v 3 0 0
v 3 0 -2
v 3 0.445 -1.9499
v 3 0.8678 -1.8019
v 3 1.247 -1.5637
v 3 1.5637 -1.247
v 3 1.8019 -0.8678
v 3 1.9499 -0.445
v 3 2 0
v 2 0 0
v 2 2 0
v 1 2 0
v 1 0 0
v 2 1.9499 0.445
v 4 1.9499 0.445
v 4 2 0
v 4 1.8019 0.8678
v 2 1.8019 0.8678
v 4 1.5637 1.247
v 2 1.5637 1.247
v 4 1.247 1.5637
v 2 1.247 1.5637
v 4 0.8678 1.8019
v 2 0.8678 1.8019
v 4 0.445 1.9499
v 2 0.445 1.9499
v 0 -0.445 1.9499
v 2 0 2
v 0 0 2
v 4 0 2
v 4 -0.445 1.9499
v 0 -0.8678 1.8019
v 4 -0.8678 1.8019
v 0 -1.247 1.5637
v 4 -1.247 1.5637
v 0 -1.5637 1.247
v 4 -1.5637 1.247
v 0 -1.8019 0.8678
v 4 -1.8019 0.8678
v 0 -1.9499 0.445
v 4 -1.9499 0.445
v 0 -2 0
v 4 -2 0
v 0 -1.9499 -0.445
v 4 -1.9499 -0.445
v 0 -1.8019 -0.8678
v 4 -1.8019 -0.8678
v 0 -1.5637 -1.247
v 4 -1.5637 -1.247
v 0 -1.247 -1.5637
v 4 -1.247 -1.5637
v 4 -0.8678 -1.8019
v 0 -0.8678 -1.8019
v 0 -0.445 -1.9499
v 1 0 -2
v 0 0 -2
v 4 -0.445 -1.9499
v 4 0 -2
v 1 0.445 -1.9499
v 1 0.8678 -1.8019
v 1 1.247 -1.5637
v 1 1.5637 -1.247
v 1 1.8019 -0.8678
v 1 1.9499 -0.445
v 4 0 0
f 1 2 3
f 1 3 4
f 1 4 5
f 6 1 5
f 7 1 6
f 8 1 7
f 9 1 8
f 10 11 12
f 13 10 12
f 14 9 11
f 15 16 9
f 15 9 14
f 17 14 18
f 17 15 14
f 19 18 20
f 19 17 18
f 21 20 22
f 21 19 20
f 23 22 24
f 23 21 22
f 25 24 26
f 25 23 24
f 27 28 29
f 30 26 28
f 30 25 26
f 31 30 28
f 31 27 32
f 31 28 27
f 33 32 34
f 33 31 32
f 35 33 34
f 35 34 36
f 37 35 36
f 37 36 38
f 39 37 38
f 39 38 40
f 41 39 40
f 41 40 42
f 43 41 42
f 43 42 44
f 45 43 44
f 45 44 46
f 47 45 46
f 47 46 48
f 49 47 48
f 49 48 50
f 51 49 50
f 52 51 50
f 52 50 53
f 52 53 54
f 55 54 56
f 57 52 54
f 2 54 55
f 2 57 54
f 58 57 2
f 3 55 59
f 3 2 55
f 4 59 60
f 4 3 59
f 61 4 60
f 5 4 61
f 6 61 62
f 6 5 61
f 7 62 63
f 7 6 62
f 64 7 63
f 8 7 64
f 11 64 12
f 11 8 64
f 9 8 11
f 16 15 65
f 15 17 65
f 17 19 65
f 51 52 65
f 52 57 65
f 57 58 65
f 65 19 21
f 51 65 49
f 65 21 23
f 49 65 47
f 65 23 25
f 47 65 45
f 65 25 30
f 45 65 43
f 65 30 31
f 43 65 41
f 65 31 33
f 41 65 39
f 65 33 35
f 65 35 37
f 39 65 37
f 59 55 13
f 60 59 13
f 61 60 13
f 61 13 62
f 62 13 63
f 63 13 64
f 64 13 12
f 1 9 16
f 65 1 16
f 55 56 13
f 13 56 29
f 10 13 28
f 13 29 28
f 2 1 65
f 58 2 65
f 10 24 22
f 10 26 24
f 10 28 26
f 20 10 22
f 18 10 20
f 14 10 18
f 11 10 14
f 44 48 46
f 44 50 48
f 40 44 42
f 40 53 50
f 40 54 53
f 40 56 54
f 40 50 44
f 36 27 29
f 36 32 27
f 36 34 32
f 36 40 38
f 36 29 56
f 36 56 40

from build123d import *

# Parameters (mm, degrees)
SKETCH5_W          = 4
SKETCH5_H          = 2
SKETCH6_W          = 1
SKETCH6_H          = 2
CUT_EXTRUDE5_DEPTH = 11
SKETCH8_W          = 0.5
SKETCH8_H          = 2
CUT_EXTRUDE7_DEPTH = 10
SKETCH9_W          = 1.5
SKETCH9_H          = 2
CUT_EXTRUDE8_DEPTH = 10


with BuildPart() as part:
    # Sketch5 → Revolve-Thin2 (revolve)
    with BuildSketch(Plane.XY):
        with Locations((2, 1)):
            Rectangle(SKETCH5_W, SKETCH5_H)
    revolve(axis=Axis((0, 0, 0), (1, 0, 0)))

    # Sketch6 → Cut-Extrude5 (cut)
    with BuildSketch(Plane.XY):
        with Locations((3.5, 1)):
            Rectangle(SKETCH6_W, SKETCH6_H)
        with Locations((0.5, 1)):
            Rectangle(SKETCH6_W, SKETCH6_H)
    extrude(amount=-CUT_EXTRUDE5_DEPTH, mode=Mode.SUBTRACT)

    # Sketch8 → Cut-Extrude7 (cut)
    with BuildSketch(Plane(origin=(0, 0, 0), x_dir=(-1, 0, 0), z_dir=(0, 0, -1))):
        with Locations((-0.25, 1)):
            Rectangle(SKETCH8_W, SKETCH8_H)
    extrude(amount=-CUT_EXTRUDE7_DEPTH, mode=Mode.SUBTRACT)

    # Sketch9 → Cut-Extrude8 (cut)
    with BuildSketch(Plane(origin=(0, 0, 0), x_dir=(-1, 0, 0), z_dir=(0, 0, -1))):
        with Locations((-1.25, 1)):
            Rectangle(SKETCH9_W, SKETCH9_H)
    extrude(amount=-CUT_EXTRUDE8_DEPTH, mode=Mode.SUBTRACT)


solid = part.part
